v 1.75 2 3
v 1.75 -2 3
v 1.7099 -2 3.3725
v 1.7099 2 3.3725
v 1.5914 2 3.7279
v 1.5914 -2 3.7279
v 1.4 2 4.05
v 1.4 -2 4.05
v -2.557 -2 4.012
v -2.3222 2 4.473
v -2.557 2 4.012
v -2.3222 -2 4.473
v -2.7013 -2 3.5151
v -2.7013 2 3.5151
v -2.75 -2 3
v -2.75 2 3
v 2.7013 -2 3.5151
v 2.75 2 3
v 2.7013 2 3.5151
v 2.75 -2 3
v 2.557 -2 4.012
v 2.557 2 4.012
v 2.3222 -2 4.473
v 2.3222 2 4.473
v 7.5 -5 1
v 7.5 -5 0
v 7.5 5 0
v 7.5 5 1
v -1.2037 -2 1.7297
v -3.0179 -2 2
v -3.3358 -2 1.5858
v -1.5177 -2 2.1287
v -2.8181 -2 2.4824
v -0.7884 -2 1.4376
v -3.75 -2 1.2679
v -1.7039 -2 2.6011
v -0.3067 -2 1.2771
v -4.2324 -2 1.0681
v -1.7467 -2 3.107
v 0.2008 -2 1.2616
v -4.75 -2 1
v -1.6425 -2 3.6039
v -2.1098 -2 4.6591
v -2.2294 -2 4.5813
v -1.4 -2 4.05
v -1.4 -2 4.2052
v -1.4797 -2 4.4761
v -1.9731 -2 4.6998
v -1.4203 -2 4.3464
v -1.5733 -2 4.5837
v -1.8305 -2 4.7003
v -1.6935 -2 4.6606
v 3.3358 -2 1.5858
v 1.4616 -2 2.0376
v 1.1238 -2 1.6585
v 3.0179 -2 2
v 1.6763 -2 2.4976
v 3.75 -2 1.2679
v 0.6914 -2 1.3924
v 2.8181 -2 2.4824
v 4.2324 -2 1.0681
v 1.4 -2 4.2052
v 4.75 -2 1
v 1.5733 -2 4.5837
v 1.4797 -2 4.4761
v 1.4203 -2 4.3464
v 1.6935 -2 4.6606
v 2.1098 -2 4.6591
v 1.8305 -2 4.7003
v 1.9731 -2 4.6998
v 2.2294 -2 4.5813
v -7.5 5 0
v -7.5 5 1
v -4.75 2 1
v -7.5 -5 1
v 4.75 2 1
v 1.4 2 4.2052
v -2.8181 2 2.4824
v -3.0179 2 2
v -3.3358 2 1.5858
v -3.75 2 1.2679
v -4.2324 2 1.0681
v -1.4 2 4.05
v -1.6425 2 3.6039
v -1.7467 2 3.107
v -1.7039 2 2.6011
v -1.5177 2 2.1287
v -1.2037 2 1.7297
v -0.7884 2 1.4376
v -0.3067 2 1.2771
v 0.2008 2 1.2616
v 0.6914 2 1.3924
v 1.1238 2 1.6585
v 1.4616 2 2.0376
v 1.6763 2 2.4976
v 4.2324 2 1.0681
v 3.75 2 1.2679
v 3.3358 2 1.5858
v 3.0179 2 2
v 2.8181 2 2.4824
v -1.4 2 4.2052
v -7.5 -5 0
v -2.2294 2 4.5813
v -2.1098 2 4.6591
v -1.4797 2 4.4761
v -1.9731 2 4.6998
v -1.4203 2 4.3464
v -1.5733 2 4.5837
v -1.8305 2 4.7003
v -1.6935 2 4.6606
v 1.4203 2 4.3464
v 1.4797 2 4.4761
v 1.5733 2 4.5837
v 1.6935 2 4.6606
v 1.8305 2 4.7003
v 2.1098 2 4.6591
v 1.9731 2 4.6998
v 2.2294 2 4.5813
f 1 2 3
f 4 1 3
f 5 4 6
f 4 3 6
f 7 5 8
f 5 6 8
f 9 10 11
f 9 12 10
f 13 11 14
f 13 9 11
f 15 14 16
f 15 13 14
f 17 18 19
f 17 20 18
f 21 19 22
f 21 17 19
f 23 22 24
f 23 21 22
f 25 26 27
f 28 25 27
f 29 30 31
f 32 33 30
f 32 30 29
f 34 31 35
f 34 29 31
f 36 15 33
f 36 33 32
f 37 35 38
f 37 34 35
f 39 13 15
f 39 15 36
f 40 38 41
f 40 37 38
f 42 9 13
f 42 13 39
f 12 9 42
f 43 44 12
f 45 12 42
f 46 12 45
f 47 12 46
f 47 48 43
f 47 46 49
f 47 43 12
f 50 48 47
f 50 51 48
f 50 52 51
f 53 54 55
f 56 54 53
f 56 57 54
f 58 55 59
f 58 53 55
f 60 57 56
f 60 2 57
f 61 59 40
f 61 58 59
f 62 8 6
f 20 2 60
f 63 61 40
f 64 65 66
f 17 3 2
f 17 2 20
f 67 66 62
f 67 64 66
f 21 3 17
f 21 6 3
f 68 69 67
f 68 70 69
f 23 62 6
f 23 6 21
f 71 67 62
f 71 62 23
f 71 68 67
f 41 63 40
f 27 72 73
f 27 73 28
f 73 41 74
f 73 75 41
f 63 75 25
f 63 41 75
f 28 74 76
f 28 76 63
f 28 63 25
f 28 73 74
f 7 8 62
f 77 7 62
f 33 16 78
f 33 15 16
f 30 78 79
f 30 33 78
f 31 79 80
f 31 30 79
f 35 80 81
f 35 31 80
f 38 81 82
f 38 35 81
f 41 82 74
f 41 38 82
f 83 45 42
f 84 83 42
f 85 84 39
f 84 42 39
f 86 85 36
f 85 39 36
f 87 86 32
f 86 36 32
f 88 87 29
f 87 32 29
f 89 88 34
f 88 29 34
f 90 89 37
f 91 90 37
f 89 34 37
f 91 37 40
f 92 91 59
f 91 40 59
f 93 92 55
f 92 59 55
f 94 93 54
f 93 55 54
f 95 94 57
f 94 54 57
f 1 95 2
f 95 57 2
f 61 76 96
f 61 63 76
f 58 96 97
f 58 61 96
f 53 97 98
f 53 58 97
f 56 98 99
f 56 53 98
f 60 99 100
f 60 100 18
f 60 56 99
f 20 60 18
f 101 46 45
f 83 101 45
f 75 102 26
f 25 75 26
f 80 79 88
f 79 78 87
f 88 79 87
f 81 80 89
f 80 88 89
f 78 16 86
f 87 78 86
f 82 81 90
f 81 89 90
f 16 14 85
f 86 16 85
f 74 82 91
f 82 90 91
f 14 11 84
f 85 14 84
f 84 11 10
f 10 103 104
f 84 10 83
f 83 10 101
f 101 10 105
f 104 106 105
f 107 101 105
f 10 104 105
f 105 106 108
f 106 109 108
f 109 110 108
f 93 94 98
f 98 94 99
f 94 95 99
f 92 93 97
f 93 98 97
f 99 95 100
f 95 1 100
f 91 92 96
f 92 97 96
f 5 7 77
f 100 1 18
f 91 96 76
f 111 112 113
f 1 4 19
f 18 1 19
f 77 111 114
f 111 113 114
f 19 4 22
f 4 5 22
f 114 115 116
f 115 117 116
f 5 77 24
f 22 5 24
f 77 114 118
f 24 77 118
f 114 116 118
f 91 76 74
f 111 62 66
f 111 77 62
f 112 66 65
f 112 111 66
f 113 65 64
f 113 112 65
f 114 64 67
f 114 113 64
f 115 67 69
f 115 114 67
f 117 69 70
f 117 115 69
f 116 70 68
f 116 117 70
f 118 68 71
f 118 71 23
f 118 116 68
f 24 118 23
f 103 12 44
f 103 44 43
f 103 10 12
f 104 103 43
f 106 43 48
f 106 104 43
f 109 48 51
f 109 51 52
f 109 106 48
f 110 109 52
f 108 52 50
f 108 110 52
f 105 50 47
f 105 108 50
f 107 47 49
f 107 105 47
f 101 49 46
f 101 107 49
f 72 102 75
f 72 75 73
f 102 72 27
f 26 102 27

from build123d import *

# Parameters (mm, degrees)
F1_W     = 15
F1_H     = 10
F2_DEPTH = 1
F3_R     = 2.75
F4_DEPTH = 2
F6_DEPTH = 4
F7_R     = 2
F8_R     = 0.5


with BuildPart() as f2:
    # F1 (on Top) → F2 (new body)
    with BuildSketch(Plane.XY):
        Rectangle(F1_W, F1_H)
    extrude(amount=F2_DEPTH)

    # F3 (on Front) → F4 (join, symmetric)
    with BuildSketch(Plane.XZ):
        with Locations((0, 3)):
            Circle(F3_R)
    extrude(amount=F4_DEPTH, both=True)

    # F5 (on face) → F6 (cut, through all)
    with BuildSketch(Plane.XZ.offset(2)):
        with BuildLine():
            ThreePointArc((-1.4, 4.05), (-0.5533985905, 1.3398042284), (1.75, 3))
            ThreePointArc((1.75, 3), (1.6601957716, 3.5533985905), (1.4, 4.05))
            Line((1.4, 4.05), (1.4, 3.103264831))
            Line((1.4, 3.103264831), (-1.4, 3.103264831))
            Line((-1.4, 3.103264831), (-1.4, 4.05))
        make_face()
        with BuildLine():
            Line((1.4, 3.103264831), (1.4, 4.05))
            ThreePointArc((1.4, 4.05), (0, 4.75), (-1.4, 4.05))
            Line((-1.4, 4.05), (-1.4, 3.103264831))
            Line((-1.4, 3.103264831), (1.4, 3.103264831))
        make_face()
        with BuildLine():
            ThreePointArc((-1.4, 4.05), (0, 4.75), (1.4, 4.05))
            Line((1.4, 4.05), (1.4, 5.3669600757))
            ThreePointArc((1.4, 5.3669600757), (0, 5.75), (-1.4, 5.3669600757))
            Line((-1.4, 5.3669600757), (-1.4, 4.05))
        make_face()
    extrude(amount=-F6_DEPTH, mode=Mode.SUBTRACT)

    # F7
    f7_edges = [f2.edges().sort_by_distance(p)[0] for p in [
        (-1.887459, 0, 1),
        (1.887459, 0, 1),
    ]]
    fillet(f7_edges, radius=F7_R)

    # F8
    f8_edges = [f2.edges().sort_by_distance(p)[0] for p in [
        (-1.4, 0, 5.36696),
        (1.4, 0, 5.36696),
    ]]
    fillet(f8_edges, radius=F8_R)


solid = f2.part
